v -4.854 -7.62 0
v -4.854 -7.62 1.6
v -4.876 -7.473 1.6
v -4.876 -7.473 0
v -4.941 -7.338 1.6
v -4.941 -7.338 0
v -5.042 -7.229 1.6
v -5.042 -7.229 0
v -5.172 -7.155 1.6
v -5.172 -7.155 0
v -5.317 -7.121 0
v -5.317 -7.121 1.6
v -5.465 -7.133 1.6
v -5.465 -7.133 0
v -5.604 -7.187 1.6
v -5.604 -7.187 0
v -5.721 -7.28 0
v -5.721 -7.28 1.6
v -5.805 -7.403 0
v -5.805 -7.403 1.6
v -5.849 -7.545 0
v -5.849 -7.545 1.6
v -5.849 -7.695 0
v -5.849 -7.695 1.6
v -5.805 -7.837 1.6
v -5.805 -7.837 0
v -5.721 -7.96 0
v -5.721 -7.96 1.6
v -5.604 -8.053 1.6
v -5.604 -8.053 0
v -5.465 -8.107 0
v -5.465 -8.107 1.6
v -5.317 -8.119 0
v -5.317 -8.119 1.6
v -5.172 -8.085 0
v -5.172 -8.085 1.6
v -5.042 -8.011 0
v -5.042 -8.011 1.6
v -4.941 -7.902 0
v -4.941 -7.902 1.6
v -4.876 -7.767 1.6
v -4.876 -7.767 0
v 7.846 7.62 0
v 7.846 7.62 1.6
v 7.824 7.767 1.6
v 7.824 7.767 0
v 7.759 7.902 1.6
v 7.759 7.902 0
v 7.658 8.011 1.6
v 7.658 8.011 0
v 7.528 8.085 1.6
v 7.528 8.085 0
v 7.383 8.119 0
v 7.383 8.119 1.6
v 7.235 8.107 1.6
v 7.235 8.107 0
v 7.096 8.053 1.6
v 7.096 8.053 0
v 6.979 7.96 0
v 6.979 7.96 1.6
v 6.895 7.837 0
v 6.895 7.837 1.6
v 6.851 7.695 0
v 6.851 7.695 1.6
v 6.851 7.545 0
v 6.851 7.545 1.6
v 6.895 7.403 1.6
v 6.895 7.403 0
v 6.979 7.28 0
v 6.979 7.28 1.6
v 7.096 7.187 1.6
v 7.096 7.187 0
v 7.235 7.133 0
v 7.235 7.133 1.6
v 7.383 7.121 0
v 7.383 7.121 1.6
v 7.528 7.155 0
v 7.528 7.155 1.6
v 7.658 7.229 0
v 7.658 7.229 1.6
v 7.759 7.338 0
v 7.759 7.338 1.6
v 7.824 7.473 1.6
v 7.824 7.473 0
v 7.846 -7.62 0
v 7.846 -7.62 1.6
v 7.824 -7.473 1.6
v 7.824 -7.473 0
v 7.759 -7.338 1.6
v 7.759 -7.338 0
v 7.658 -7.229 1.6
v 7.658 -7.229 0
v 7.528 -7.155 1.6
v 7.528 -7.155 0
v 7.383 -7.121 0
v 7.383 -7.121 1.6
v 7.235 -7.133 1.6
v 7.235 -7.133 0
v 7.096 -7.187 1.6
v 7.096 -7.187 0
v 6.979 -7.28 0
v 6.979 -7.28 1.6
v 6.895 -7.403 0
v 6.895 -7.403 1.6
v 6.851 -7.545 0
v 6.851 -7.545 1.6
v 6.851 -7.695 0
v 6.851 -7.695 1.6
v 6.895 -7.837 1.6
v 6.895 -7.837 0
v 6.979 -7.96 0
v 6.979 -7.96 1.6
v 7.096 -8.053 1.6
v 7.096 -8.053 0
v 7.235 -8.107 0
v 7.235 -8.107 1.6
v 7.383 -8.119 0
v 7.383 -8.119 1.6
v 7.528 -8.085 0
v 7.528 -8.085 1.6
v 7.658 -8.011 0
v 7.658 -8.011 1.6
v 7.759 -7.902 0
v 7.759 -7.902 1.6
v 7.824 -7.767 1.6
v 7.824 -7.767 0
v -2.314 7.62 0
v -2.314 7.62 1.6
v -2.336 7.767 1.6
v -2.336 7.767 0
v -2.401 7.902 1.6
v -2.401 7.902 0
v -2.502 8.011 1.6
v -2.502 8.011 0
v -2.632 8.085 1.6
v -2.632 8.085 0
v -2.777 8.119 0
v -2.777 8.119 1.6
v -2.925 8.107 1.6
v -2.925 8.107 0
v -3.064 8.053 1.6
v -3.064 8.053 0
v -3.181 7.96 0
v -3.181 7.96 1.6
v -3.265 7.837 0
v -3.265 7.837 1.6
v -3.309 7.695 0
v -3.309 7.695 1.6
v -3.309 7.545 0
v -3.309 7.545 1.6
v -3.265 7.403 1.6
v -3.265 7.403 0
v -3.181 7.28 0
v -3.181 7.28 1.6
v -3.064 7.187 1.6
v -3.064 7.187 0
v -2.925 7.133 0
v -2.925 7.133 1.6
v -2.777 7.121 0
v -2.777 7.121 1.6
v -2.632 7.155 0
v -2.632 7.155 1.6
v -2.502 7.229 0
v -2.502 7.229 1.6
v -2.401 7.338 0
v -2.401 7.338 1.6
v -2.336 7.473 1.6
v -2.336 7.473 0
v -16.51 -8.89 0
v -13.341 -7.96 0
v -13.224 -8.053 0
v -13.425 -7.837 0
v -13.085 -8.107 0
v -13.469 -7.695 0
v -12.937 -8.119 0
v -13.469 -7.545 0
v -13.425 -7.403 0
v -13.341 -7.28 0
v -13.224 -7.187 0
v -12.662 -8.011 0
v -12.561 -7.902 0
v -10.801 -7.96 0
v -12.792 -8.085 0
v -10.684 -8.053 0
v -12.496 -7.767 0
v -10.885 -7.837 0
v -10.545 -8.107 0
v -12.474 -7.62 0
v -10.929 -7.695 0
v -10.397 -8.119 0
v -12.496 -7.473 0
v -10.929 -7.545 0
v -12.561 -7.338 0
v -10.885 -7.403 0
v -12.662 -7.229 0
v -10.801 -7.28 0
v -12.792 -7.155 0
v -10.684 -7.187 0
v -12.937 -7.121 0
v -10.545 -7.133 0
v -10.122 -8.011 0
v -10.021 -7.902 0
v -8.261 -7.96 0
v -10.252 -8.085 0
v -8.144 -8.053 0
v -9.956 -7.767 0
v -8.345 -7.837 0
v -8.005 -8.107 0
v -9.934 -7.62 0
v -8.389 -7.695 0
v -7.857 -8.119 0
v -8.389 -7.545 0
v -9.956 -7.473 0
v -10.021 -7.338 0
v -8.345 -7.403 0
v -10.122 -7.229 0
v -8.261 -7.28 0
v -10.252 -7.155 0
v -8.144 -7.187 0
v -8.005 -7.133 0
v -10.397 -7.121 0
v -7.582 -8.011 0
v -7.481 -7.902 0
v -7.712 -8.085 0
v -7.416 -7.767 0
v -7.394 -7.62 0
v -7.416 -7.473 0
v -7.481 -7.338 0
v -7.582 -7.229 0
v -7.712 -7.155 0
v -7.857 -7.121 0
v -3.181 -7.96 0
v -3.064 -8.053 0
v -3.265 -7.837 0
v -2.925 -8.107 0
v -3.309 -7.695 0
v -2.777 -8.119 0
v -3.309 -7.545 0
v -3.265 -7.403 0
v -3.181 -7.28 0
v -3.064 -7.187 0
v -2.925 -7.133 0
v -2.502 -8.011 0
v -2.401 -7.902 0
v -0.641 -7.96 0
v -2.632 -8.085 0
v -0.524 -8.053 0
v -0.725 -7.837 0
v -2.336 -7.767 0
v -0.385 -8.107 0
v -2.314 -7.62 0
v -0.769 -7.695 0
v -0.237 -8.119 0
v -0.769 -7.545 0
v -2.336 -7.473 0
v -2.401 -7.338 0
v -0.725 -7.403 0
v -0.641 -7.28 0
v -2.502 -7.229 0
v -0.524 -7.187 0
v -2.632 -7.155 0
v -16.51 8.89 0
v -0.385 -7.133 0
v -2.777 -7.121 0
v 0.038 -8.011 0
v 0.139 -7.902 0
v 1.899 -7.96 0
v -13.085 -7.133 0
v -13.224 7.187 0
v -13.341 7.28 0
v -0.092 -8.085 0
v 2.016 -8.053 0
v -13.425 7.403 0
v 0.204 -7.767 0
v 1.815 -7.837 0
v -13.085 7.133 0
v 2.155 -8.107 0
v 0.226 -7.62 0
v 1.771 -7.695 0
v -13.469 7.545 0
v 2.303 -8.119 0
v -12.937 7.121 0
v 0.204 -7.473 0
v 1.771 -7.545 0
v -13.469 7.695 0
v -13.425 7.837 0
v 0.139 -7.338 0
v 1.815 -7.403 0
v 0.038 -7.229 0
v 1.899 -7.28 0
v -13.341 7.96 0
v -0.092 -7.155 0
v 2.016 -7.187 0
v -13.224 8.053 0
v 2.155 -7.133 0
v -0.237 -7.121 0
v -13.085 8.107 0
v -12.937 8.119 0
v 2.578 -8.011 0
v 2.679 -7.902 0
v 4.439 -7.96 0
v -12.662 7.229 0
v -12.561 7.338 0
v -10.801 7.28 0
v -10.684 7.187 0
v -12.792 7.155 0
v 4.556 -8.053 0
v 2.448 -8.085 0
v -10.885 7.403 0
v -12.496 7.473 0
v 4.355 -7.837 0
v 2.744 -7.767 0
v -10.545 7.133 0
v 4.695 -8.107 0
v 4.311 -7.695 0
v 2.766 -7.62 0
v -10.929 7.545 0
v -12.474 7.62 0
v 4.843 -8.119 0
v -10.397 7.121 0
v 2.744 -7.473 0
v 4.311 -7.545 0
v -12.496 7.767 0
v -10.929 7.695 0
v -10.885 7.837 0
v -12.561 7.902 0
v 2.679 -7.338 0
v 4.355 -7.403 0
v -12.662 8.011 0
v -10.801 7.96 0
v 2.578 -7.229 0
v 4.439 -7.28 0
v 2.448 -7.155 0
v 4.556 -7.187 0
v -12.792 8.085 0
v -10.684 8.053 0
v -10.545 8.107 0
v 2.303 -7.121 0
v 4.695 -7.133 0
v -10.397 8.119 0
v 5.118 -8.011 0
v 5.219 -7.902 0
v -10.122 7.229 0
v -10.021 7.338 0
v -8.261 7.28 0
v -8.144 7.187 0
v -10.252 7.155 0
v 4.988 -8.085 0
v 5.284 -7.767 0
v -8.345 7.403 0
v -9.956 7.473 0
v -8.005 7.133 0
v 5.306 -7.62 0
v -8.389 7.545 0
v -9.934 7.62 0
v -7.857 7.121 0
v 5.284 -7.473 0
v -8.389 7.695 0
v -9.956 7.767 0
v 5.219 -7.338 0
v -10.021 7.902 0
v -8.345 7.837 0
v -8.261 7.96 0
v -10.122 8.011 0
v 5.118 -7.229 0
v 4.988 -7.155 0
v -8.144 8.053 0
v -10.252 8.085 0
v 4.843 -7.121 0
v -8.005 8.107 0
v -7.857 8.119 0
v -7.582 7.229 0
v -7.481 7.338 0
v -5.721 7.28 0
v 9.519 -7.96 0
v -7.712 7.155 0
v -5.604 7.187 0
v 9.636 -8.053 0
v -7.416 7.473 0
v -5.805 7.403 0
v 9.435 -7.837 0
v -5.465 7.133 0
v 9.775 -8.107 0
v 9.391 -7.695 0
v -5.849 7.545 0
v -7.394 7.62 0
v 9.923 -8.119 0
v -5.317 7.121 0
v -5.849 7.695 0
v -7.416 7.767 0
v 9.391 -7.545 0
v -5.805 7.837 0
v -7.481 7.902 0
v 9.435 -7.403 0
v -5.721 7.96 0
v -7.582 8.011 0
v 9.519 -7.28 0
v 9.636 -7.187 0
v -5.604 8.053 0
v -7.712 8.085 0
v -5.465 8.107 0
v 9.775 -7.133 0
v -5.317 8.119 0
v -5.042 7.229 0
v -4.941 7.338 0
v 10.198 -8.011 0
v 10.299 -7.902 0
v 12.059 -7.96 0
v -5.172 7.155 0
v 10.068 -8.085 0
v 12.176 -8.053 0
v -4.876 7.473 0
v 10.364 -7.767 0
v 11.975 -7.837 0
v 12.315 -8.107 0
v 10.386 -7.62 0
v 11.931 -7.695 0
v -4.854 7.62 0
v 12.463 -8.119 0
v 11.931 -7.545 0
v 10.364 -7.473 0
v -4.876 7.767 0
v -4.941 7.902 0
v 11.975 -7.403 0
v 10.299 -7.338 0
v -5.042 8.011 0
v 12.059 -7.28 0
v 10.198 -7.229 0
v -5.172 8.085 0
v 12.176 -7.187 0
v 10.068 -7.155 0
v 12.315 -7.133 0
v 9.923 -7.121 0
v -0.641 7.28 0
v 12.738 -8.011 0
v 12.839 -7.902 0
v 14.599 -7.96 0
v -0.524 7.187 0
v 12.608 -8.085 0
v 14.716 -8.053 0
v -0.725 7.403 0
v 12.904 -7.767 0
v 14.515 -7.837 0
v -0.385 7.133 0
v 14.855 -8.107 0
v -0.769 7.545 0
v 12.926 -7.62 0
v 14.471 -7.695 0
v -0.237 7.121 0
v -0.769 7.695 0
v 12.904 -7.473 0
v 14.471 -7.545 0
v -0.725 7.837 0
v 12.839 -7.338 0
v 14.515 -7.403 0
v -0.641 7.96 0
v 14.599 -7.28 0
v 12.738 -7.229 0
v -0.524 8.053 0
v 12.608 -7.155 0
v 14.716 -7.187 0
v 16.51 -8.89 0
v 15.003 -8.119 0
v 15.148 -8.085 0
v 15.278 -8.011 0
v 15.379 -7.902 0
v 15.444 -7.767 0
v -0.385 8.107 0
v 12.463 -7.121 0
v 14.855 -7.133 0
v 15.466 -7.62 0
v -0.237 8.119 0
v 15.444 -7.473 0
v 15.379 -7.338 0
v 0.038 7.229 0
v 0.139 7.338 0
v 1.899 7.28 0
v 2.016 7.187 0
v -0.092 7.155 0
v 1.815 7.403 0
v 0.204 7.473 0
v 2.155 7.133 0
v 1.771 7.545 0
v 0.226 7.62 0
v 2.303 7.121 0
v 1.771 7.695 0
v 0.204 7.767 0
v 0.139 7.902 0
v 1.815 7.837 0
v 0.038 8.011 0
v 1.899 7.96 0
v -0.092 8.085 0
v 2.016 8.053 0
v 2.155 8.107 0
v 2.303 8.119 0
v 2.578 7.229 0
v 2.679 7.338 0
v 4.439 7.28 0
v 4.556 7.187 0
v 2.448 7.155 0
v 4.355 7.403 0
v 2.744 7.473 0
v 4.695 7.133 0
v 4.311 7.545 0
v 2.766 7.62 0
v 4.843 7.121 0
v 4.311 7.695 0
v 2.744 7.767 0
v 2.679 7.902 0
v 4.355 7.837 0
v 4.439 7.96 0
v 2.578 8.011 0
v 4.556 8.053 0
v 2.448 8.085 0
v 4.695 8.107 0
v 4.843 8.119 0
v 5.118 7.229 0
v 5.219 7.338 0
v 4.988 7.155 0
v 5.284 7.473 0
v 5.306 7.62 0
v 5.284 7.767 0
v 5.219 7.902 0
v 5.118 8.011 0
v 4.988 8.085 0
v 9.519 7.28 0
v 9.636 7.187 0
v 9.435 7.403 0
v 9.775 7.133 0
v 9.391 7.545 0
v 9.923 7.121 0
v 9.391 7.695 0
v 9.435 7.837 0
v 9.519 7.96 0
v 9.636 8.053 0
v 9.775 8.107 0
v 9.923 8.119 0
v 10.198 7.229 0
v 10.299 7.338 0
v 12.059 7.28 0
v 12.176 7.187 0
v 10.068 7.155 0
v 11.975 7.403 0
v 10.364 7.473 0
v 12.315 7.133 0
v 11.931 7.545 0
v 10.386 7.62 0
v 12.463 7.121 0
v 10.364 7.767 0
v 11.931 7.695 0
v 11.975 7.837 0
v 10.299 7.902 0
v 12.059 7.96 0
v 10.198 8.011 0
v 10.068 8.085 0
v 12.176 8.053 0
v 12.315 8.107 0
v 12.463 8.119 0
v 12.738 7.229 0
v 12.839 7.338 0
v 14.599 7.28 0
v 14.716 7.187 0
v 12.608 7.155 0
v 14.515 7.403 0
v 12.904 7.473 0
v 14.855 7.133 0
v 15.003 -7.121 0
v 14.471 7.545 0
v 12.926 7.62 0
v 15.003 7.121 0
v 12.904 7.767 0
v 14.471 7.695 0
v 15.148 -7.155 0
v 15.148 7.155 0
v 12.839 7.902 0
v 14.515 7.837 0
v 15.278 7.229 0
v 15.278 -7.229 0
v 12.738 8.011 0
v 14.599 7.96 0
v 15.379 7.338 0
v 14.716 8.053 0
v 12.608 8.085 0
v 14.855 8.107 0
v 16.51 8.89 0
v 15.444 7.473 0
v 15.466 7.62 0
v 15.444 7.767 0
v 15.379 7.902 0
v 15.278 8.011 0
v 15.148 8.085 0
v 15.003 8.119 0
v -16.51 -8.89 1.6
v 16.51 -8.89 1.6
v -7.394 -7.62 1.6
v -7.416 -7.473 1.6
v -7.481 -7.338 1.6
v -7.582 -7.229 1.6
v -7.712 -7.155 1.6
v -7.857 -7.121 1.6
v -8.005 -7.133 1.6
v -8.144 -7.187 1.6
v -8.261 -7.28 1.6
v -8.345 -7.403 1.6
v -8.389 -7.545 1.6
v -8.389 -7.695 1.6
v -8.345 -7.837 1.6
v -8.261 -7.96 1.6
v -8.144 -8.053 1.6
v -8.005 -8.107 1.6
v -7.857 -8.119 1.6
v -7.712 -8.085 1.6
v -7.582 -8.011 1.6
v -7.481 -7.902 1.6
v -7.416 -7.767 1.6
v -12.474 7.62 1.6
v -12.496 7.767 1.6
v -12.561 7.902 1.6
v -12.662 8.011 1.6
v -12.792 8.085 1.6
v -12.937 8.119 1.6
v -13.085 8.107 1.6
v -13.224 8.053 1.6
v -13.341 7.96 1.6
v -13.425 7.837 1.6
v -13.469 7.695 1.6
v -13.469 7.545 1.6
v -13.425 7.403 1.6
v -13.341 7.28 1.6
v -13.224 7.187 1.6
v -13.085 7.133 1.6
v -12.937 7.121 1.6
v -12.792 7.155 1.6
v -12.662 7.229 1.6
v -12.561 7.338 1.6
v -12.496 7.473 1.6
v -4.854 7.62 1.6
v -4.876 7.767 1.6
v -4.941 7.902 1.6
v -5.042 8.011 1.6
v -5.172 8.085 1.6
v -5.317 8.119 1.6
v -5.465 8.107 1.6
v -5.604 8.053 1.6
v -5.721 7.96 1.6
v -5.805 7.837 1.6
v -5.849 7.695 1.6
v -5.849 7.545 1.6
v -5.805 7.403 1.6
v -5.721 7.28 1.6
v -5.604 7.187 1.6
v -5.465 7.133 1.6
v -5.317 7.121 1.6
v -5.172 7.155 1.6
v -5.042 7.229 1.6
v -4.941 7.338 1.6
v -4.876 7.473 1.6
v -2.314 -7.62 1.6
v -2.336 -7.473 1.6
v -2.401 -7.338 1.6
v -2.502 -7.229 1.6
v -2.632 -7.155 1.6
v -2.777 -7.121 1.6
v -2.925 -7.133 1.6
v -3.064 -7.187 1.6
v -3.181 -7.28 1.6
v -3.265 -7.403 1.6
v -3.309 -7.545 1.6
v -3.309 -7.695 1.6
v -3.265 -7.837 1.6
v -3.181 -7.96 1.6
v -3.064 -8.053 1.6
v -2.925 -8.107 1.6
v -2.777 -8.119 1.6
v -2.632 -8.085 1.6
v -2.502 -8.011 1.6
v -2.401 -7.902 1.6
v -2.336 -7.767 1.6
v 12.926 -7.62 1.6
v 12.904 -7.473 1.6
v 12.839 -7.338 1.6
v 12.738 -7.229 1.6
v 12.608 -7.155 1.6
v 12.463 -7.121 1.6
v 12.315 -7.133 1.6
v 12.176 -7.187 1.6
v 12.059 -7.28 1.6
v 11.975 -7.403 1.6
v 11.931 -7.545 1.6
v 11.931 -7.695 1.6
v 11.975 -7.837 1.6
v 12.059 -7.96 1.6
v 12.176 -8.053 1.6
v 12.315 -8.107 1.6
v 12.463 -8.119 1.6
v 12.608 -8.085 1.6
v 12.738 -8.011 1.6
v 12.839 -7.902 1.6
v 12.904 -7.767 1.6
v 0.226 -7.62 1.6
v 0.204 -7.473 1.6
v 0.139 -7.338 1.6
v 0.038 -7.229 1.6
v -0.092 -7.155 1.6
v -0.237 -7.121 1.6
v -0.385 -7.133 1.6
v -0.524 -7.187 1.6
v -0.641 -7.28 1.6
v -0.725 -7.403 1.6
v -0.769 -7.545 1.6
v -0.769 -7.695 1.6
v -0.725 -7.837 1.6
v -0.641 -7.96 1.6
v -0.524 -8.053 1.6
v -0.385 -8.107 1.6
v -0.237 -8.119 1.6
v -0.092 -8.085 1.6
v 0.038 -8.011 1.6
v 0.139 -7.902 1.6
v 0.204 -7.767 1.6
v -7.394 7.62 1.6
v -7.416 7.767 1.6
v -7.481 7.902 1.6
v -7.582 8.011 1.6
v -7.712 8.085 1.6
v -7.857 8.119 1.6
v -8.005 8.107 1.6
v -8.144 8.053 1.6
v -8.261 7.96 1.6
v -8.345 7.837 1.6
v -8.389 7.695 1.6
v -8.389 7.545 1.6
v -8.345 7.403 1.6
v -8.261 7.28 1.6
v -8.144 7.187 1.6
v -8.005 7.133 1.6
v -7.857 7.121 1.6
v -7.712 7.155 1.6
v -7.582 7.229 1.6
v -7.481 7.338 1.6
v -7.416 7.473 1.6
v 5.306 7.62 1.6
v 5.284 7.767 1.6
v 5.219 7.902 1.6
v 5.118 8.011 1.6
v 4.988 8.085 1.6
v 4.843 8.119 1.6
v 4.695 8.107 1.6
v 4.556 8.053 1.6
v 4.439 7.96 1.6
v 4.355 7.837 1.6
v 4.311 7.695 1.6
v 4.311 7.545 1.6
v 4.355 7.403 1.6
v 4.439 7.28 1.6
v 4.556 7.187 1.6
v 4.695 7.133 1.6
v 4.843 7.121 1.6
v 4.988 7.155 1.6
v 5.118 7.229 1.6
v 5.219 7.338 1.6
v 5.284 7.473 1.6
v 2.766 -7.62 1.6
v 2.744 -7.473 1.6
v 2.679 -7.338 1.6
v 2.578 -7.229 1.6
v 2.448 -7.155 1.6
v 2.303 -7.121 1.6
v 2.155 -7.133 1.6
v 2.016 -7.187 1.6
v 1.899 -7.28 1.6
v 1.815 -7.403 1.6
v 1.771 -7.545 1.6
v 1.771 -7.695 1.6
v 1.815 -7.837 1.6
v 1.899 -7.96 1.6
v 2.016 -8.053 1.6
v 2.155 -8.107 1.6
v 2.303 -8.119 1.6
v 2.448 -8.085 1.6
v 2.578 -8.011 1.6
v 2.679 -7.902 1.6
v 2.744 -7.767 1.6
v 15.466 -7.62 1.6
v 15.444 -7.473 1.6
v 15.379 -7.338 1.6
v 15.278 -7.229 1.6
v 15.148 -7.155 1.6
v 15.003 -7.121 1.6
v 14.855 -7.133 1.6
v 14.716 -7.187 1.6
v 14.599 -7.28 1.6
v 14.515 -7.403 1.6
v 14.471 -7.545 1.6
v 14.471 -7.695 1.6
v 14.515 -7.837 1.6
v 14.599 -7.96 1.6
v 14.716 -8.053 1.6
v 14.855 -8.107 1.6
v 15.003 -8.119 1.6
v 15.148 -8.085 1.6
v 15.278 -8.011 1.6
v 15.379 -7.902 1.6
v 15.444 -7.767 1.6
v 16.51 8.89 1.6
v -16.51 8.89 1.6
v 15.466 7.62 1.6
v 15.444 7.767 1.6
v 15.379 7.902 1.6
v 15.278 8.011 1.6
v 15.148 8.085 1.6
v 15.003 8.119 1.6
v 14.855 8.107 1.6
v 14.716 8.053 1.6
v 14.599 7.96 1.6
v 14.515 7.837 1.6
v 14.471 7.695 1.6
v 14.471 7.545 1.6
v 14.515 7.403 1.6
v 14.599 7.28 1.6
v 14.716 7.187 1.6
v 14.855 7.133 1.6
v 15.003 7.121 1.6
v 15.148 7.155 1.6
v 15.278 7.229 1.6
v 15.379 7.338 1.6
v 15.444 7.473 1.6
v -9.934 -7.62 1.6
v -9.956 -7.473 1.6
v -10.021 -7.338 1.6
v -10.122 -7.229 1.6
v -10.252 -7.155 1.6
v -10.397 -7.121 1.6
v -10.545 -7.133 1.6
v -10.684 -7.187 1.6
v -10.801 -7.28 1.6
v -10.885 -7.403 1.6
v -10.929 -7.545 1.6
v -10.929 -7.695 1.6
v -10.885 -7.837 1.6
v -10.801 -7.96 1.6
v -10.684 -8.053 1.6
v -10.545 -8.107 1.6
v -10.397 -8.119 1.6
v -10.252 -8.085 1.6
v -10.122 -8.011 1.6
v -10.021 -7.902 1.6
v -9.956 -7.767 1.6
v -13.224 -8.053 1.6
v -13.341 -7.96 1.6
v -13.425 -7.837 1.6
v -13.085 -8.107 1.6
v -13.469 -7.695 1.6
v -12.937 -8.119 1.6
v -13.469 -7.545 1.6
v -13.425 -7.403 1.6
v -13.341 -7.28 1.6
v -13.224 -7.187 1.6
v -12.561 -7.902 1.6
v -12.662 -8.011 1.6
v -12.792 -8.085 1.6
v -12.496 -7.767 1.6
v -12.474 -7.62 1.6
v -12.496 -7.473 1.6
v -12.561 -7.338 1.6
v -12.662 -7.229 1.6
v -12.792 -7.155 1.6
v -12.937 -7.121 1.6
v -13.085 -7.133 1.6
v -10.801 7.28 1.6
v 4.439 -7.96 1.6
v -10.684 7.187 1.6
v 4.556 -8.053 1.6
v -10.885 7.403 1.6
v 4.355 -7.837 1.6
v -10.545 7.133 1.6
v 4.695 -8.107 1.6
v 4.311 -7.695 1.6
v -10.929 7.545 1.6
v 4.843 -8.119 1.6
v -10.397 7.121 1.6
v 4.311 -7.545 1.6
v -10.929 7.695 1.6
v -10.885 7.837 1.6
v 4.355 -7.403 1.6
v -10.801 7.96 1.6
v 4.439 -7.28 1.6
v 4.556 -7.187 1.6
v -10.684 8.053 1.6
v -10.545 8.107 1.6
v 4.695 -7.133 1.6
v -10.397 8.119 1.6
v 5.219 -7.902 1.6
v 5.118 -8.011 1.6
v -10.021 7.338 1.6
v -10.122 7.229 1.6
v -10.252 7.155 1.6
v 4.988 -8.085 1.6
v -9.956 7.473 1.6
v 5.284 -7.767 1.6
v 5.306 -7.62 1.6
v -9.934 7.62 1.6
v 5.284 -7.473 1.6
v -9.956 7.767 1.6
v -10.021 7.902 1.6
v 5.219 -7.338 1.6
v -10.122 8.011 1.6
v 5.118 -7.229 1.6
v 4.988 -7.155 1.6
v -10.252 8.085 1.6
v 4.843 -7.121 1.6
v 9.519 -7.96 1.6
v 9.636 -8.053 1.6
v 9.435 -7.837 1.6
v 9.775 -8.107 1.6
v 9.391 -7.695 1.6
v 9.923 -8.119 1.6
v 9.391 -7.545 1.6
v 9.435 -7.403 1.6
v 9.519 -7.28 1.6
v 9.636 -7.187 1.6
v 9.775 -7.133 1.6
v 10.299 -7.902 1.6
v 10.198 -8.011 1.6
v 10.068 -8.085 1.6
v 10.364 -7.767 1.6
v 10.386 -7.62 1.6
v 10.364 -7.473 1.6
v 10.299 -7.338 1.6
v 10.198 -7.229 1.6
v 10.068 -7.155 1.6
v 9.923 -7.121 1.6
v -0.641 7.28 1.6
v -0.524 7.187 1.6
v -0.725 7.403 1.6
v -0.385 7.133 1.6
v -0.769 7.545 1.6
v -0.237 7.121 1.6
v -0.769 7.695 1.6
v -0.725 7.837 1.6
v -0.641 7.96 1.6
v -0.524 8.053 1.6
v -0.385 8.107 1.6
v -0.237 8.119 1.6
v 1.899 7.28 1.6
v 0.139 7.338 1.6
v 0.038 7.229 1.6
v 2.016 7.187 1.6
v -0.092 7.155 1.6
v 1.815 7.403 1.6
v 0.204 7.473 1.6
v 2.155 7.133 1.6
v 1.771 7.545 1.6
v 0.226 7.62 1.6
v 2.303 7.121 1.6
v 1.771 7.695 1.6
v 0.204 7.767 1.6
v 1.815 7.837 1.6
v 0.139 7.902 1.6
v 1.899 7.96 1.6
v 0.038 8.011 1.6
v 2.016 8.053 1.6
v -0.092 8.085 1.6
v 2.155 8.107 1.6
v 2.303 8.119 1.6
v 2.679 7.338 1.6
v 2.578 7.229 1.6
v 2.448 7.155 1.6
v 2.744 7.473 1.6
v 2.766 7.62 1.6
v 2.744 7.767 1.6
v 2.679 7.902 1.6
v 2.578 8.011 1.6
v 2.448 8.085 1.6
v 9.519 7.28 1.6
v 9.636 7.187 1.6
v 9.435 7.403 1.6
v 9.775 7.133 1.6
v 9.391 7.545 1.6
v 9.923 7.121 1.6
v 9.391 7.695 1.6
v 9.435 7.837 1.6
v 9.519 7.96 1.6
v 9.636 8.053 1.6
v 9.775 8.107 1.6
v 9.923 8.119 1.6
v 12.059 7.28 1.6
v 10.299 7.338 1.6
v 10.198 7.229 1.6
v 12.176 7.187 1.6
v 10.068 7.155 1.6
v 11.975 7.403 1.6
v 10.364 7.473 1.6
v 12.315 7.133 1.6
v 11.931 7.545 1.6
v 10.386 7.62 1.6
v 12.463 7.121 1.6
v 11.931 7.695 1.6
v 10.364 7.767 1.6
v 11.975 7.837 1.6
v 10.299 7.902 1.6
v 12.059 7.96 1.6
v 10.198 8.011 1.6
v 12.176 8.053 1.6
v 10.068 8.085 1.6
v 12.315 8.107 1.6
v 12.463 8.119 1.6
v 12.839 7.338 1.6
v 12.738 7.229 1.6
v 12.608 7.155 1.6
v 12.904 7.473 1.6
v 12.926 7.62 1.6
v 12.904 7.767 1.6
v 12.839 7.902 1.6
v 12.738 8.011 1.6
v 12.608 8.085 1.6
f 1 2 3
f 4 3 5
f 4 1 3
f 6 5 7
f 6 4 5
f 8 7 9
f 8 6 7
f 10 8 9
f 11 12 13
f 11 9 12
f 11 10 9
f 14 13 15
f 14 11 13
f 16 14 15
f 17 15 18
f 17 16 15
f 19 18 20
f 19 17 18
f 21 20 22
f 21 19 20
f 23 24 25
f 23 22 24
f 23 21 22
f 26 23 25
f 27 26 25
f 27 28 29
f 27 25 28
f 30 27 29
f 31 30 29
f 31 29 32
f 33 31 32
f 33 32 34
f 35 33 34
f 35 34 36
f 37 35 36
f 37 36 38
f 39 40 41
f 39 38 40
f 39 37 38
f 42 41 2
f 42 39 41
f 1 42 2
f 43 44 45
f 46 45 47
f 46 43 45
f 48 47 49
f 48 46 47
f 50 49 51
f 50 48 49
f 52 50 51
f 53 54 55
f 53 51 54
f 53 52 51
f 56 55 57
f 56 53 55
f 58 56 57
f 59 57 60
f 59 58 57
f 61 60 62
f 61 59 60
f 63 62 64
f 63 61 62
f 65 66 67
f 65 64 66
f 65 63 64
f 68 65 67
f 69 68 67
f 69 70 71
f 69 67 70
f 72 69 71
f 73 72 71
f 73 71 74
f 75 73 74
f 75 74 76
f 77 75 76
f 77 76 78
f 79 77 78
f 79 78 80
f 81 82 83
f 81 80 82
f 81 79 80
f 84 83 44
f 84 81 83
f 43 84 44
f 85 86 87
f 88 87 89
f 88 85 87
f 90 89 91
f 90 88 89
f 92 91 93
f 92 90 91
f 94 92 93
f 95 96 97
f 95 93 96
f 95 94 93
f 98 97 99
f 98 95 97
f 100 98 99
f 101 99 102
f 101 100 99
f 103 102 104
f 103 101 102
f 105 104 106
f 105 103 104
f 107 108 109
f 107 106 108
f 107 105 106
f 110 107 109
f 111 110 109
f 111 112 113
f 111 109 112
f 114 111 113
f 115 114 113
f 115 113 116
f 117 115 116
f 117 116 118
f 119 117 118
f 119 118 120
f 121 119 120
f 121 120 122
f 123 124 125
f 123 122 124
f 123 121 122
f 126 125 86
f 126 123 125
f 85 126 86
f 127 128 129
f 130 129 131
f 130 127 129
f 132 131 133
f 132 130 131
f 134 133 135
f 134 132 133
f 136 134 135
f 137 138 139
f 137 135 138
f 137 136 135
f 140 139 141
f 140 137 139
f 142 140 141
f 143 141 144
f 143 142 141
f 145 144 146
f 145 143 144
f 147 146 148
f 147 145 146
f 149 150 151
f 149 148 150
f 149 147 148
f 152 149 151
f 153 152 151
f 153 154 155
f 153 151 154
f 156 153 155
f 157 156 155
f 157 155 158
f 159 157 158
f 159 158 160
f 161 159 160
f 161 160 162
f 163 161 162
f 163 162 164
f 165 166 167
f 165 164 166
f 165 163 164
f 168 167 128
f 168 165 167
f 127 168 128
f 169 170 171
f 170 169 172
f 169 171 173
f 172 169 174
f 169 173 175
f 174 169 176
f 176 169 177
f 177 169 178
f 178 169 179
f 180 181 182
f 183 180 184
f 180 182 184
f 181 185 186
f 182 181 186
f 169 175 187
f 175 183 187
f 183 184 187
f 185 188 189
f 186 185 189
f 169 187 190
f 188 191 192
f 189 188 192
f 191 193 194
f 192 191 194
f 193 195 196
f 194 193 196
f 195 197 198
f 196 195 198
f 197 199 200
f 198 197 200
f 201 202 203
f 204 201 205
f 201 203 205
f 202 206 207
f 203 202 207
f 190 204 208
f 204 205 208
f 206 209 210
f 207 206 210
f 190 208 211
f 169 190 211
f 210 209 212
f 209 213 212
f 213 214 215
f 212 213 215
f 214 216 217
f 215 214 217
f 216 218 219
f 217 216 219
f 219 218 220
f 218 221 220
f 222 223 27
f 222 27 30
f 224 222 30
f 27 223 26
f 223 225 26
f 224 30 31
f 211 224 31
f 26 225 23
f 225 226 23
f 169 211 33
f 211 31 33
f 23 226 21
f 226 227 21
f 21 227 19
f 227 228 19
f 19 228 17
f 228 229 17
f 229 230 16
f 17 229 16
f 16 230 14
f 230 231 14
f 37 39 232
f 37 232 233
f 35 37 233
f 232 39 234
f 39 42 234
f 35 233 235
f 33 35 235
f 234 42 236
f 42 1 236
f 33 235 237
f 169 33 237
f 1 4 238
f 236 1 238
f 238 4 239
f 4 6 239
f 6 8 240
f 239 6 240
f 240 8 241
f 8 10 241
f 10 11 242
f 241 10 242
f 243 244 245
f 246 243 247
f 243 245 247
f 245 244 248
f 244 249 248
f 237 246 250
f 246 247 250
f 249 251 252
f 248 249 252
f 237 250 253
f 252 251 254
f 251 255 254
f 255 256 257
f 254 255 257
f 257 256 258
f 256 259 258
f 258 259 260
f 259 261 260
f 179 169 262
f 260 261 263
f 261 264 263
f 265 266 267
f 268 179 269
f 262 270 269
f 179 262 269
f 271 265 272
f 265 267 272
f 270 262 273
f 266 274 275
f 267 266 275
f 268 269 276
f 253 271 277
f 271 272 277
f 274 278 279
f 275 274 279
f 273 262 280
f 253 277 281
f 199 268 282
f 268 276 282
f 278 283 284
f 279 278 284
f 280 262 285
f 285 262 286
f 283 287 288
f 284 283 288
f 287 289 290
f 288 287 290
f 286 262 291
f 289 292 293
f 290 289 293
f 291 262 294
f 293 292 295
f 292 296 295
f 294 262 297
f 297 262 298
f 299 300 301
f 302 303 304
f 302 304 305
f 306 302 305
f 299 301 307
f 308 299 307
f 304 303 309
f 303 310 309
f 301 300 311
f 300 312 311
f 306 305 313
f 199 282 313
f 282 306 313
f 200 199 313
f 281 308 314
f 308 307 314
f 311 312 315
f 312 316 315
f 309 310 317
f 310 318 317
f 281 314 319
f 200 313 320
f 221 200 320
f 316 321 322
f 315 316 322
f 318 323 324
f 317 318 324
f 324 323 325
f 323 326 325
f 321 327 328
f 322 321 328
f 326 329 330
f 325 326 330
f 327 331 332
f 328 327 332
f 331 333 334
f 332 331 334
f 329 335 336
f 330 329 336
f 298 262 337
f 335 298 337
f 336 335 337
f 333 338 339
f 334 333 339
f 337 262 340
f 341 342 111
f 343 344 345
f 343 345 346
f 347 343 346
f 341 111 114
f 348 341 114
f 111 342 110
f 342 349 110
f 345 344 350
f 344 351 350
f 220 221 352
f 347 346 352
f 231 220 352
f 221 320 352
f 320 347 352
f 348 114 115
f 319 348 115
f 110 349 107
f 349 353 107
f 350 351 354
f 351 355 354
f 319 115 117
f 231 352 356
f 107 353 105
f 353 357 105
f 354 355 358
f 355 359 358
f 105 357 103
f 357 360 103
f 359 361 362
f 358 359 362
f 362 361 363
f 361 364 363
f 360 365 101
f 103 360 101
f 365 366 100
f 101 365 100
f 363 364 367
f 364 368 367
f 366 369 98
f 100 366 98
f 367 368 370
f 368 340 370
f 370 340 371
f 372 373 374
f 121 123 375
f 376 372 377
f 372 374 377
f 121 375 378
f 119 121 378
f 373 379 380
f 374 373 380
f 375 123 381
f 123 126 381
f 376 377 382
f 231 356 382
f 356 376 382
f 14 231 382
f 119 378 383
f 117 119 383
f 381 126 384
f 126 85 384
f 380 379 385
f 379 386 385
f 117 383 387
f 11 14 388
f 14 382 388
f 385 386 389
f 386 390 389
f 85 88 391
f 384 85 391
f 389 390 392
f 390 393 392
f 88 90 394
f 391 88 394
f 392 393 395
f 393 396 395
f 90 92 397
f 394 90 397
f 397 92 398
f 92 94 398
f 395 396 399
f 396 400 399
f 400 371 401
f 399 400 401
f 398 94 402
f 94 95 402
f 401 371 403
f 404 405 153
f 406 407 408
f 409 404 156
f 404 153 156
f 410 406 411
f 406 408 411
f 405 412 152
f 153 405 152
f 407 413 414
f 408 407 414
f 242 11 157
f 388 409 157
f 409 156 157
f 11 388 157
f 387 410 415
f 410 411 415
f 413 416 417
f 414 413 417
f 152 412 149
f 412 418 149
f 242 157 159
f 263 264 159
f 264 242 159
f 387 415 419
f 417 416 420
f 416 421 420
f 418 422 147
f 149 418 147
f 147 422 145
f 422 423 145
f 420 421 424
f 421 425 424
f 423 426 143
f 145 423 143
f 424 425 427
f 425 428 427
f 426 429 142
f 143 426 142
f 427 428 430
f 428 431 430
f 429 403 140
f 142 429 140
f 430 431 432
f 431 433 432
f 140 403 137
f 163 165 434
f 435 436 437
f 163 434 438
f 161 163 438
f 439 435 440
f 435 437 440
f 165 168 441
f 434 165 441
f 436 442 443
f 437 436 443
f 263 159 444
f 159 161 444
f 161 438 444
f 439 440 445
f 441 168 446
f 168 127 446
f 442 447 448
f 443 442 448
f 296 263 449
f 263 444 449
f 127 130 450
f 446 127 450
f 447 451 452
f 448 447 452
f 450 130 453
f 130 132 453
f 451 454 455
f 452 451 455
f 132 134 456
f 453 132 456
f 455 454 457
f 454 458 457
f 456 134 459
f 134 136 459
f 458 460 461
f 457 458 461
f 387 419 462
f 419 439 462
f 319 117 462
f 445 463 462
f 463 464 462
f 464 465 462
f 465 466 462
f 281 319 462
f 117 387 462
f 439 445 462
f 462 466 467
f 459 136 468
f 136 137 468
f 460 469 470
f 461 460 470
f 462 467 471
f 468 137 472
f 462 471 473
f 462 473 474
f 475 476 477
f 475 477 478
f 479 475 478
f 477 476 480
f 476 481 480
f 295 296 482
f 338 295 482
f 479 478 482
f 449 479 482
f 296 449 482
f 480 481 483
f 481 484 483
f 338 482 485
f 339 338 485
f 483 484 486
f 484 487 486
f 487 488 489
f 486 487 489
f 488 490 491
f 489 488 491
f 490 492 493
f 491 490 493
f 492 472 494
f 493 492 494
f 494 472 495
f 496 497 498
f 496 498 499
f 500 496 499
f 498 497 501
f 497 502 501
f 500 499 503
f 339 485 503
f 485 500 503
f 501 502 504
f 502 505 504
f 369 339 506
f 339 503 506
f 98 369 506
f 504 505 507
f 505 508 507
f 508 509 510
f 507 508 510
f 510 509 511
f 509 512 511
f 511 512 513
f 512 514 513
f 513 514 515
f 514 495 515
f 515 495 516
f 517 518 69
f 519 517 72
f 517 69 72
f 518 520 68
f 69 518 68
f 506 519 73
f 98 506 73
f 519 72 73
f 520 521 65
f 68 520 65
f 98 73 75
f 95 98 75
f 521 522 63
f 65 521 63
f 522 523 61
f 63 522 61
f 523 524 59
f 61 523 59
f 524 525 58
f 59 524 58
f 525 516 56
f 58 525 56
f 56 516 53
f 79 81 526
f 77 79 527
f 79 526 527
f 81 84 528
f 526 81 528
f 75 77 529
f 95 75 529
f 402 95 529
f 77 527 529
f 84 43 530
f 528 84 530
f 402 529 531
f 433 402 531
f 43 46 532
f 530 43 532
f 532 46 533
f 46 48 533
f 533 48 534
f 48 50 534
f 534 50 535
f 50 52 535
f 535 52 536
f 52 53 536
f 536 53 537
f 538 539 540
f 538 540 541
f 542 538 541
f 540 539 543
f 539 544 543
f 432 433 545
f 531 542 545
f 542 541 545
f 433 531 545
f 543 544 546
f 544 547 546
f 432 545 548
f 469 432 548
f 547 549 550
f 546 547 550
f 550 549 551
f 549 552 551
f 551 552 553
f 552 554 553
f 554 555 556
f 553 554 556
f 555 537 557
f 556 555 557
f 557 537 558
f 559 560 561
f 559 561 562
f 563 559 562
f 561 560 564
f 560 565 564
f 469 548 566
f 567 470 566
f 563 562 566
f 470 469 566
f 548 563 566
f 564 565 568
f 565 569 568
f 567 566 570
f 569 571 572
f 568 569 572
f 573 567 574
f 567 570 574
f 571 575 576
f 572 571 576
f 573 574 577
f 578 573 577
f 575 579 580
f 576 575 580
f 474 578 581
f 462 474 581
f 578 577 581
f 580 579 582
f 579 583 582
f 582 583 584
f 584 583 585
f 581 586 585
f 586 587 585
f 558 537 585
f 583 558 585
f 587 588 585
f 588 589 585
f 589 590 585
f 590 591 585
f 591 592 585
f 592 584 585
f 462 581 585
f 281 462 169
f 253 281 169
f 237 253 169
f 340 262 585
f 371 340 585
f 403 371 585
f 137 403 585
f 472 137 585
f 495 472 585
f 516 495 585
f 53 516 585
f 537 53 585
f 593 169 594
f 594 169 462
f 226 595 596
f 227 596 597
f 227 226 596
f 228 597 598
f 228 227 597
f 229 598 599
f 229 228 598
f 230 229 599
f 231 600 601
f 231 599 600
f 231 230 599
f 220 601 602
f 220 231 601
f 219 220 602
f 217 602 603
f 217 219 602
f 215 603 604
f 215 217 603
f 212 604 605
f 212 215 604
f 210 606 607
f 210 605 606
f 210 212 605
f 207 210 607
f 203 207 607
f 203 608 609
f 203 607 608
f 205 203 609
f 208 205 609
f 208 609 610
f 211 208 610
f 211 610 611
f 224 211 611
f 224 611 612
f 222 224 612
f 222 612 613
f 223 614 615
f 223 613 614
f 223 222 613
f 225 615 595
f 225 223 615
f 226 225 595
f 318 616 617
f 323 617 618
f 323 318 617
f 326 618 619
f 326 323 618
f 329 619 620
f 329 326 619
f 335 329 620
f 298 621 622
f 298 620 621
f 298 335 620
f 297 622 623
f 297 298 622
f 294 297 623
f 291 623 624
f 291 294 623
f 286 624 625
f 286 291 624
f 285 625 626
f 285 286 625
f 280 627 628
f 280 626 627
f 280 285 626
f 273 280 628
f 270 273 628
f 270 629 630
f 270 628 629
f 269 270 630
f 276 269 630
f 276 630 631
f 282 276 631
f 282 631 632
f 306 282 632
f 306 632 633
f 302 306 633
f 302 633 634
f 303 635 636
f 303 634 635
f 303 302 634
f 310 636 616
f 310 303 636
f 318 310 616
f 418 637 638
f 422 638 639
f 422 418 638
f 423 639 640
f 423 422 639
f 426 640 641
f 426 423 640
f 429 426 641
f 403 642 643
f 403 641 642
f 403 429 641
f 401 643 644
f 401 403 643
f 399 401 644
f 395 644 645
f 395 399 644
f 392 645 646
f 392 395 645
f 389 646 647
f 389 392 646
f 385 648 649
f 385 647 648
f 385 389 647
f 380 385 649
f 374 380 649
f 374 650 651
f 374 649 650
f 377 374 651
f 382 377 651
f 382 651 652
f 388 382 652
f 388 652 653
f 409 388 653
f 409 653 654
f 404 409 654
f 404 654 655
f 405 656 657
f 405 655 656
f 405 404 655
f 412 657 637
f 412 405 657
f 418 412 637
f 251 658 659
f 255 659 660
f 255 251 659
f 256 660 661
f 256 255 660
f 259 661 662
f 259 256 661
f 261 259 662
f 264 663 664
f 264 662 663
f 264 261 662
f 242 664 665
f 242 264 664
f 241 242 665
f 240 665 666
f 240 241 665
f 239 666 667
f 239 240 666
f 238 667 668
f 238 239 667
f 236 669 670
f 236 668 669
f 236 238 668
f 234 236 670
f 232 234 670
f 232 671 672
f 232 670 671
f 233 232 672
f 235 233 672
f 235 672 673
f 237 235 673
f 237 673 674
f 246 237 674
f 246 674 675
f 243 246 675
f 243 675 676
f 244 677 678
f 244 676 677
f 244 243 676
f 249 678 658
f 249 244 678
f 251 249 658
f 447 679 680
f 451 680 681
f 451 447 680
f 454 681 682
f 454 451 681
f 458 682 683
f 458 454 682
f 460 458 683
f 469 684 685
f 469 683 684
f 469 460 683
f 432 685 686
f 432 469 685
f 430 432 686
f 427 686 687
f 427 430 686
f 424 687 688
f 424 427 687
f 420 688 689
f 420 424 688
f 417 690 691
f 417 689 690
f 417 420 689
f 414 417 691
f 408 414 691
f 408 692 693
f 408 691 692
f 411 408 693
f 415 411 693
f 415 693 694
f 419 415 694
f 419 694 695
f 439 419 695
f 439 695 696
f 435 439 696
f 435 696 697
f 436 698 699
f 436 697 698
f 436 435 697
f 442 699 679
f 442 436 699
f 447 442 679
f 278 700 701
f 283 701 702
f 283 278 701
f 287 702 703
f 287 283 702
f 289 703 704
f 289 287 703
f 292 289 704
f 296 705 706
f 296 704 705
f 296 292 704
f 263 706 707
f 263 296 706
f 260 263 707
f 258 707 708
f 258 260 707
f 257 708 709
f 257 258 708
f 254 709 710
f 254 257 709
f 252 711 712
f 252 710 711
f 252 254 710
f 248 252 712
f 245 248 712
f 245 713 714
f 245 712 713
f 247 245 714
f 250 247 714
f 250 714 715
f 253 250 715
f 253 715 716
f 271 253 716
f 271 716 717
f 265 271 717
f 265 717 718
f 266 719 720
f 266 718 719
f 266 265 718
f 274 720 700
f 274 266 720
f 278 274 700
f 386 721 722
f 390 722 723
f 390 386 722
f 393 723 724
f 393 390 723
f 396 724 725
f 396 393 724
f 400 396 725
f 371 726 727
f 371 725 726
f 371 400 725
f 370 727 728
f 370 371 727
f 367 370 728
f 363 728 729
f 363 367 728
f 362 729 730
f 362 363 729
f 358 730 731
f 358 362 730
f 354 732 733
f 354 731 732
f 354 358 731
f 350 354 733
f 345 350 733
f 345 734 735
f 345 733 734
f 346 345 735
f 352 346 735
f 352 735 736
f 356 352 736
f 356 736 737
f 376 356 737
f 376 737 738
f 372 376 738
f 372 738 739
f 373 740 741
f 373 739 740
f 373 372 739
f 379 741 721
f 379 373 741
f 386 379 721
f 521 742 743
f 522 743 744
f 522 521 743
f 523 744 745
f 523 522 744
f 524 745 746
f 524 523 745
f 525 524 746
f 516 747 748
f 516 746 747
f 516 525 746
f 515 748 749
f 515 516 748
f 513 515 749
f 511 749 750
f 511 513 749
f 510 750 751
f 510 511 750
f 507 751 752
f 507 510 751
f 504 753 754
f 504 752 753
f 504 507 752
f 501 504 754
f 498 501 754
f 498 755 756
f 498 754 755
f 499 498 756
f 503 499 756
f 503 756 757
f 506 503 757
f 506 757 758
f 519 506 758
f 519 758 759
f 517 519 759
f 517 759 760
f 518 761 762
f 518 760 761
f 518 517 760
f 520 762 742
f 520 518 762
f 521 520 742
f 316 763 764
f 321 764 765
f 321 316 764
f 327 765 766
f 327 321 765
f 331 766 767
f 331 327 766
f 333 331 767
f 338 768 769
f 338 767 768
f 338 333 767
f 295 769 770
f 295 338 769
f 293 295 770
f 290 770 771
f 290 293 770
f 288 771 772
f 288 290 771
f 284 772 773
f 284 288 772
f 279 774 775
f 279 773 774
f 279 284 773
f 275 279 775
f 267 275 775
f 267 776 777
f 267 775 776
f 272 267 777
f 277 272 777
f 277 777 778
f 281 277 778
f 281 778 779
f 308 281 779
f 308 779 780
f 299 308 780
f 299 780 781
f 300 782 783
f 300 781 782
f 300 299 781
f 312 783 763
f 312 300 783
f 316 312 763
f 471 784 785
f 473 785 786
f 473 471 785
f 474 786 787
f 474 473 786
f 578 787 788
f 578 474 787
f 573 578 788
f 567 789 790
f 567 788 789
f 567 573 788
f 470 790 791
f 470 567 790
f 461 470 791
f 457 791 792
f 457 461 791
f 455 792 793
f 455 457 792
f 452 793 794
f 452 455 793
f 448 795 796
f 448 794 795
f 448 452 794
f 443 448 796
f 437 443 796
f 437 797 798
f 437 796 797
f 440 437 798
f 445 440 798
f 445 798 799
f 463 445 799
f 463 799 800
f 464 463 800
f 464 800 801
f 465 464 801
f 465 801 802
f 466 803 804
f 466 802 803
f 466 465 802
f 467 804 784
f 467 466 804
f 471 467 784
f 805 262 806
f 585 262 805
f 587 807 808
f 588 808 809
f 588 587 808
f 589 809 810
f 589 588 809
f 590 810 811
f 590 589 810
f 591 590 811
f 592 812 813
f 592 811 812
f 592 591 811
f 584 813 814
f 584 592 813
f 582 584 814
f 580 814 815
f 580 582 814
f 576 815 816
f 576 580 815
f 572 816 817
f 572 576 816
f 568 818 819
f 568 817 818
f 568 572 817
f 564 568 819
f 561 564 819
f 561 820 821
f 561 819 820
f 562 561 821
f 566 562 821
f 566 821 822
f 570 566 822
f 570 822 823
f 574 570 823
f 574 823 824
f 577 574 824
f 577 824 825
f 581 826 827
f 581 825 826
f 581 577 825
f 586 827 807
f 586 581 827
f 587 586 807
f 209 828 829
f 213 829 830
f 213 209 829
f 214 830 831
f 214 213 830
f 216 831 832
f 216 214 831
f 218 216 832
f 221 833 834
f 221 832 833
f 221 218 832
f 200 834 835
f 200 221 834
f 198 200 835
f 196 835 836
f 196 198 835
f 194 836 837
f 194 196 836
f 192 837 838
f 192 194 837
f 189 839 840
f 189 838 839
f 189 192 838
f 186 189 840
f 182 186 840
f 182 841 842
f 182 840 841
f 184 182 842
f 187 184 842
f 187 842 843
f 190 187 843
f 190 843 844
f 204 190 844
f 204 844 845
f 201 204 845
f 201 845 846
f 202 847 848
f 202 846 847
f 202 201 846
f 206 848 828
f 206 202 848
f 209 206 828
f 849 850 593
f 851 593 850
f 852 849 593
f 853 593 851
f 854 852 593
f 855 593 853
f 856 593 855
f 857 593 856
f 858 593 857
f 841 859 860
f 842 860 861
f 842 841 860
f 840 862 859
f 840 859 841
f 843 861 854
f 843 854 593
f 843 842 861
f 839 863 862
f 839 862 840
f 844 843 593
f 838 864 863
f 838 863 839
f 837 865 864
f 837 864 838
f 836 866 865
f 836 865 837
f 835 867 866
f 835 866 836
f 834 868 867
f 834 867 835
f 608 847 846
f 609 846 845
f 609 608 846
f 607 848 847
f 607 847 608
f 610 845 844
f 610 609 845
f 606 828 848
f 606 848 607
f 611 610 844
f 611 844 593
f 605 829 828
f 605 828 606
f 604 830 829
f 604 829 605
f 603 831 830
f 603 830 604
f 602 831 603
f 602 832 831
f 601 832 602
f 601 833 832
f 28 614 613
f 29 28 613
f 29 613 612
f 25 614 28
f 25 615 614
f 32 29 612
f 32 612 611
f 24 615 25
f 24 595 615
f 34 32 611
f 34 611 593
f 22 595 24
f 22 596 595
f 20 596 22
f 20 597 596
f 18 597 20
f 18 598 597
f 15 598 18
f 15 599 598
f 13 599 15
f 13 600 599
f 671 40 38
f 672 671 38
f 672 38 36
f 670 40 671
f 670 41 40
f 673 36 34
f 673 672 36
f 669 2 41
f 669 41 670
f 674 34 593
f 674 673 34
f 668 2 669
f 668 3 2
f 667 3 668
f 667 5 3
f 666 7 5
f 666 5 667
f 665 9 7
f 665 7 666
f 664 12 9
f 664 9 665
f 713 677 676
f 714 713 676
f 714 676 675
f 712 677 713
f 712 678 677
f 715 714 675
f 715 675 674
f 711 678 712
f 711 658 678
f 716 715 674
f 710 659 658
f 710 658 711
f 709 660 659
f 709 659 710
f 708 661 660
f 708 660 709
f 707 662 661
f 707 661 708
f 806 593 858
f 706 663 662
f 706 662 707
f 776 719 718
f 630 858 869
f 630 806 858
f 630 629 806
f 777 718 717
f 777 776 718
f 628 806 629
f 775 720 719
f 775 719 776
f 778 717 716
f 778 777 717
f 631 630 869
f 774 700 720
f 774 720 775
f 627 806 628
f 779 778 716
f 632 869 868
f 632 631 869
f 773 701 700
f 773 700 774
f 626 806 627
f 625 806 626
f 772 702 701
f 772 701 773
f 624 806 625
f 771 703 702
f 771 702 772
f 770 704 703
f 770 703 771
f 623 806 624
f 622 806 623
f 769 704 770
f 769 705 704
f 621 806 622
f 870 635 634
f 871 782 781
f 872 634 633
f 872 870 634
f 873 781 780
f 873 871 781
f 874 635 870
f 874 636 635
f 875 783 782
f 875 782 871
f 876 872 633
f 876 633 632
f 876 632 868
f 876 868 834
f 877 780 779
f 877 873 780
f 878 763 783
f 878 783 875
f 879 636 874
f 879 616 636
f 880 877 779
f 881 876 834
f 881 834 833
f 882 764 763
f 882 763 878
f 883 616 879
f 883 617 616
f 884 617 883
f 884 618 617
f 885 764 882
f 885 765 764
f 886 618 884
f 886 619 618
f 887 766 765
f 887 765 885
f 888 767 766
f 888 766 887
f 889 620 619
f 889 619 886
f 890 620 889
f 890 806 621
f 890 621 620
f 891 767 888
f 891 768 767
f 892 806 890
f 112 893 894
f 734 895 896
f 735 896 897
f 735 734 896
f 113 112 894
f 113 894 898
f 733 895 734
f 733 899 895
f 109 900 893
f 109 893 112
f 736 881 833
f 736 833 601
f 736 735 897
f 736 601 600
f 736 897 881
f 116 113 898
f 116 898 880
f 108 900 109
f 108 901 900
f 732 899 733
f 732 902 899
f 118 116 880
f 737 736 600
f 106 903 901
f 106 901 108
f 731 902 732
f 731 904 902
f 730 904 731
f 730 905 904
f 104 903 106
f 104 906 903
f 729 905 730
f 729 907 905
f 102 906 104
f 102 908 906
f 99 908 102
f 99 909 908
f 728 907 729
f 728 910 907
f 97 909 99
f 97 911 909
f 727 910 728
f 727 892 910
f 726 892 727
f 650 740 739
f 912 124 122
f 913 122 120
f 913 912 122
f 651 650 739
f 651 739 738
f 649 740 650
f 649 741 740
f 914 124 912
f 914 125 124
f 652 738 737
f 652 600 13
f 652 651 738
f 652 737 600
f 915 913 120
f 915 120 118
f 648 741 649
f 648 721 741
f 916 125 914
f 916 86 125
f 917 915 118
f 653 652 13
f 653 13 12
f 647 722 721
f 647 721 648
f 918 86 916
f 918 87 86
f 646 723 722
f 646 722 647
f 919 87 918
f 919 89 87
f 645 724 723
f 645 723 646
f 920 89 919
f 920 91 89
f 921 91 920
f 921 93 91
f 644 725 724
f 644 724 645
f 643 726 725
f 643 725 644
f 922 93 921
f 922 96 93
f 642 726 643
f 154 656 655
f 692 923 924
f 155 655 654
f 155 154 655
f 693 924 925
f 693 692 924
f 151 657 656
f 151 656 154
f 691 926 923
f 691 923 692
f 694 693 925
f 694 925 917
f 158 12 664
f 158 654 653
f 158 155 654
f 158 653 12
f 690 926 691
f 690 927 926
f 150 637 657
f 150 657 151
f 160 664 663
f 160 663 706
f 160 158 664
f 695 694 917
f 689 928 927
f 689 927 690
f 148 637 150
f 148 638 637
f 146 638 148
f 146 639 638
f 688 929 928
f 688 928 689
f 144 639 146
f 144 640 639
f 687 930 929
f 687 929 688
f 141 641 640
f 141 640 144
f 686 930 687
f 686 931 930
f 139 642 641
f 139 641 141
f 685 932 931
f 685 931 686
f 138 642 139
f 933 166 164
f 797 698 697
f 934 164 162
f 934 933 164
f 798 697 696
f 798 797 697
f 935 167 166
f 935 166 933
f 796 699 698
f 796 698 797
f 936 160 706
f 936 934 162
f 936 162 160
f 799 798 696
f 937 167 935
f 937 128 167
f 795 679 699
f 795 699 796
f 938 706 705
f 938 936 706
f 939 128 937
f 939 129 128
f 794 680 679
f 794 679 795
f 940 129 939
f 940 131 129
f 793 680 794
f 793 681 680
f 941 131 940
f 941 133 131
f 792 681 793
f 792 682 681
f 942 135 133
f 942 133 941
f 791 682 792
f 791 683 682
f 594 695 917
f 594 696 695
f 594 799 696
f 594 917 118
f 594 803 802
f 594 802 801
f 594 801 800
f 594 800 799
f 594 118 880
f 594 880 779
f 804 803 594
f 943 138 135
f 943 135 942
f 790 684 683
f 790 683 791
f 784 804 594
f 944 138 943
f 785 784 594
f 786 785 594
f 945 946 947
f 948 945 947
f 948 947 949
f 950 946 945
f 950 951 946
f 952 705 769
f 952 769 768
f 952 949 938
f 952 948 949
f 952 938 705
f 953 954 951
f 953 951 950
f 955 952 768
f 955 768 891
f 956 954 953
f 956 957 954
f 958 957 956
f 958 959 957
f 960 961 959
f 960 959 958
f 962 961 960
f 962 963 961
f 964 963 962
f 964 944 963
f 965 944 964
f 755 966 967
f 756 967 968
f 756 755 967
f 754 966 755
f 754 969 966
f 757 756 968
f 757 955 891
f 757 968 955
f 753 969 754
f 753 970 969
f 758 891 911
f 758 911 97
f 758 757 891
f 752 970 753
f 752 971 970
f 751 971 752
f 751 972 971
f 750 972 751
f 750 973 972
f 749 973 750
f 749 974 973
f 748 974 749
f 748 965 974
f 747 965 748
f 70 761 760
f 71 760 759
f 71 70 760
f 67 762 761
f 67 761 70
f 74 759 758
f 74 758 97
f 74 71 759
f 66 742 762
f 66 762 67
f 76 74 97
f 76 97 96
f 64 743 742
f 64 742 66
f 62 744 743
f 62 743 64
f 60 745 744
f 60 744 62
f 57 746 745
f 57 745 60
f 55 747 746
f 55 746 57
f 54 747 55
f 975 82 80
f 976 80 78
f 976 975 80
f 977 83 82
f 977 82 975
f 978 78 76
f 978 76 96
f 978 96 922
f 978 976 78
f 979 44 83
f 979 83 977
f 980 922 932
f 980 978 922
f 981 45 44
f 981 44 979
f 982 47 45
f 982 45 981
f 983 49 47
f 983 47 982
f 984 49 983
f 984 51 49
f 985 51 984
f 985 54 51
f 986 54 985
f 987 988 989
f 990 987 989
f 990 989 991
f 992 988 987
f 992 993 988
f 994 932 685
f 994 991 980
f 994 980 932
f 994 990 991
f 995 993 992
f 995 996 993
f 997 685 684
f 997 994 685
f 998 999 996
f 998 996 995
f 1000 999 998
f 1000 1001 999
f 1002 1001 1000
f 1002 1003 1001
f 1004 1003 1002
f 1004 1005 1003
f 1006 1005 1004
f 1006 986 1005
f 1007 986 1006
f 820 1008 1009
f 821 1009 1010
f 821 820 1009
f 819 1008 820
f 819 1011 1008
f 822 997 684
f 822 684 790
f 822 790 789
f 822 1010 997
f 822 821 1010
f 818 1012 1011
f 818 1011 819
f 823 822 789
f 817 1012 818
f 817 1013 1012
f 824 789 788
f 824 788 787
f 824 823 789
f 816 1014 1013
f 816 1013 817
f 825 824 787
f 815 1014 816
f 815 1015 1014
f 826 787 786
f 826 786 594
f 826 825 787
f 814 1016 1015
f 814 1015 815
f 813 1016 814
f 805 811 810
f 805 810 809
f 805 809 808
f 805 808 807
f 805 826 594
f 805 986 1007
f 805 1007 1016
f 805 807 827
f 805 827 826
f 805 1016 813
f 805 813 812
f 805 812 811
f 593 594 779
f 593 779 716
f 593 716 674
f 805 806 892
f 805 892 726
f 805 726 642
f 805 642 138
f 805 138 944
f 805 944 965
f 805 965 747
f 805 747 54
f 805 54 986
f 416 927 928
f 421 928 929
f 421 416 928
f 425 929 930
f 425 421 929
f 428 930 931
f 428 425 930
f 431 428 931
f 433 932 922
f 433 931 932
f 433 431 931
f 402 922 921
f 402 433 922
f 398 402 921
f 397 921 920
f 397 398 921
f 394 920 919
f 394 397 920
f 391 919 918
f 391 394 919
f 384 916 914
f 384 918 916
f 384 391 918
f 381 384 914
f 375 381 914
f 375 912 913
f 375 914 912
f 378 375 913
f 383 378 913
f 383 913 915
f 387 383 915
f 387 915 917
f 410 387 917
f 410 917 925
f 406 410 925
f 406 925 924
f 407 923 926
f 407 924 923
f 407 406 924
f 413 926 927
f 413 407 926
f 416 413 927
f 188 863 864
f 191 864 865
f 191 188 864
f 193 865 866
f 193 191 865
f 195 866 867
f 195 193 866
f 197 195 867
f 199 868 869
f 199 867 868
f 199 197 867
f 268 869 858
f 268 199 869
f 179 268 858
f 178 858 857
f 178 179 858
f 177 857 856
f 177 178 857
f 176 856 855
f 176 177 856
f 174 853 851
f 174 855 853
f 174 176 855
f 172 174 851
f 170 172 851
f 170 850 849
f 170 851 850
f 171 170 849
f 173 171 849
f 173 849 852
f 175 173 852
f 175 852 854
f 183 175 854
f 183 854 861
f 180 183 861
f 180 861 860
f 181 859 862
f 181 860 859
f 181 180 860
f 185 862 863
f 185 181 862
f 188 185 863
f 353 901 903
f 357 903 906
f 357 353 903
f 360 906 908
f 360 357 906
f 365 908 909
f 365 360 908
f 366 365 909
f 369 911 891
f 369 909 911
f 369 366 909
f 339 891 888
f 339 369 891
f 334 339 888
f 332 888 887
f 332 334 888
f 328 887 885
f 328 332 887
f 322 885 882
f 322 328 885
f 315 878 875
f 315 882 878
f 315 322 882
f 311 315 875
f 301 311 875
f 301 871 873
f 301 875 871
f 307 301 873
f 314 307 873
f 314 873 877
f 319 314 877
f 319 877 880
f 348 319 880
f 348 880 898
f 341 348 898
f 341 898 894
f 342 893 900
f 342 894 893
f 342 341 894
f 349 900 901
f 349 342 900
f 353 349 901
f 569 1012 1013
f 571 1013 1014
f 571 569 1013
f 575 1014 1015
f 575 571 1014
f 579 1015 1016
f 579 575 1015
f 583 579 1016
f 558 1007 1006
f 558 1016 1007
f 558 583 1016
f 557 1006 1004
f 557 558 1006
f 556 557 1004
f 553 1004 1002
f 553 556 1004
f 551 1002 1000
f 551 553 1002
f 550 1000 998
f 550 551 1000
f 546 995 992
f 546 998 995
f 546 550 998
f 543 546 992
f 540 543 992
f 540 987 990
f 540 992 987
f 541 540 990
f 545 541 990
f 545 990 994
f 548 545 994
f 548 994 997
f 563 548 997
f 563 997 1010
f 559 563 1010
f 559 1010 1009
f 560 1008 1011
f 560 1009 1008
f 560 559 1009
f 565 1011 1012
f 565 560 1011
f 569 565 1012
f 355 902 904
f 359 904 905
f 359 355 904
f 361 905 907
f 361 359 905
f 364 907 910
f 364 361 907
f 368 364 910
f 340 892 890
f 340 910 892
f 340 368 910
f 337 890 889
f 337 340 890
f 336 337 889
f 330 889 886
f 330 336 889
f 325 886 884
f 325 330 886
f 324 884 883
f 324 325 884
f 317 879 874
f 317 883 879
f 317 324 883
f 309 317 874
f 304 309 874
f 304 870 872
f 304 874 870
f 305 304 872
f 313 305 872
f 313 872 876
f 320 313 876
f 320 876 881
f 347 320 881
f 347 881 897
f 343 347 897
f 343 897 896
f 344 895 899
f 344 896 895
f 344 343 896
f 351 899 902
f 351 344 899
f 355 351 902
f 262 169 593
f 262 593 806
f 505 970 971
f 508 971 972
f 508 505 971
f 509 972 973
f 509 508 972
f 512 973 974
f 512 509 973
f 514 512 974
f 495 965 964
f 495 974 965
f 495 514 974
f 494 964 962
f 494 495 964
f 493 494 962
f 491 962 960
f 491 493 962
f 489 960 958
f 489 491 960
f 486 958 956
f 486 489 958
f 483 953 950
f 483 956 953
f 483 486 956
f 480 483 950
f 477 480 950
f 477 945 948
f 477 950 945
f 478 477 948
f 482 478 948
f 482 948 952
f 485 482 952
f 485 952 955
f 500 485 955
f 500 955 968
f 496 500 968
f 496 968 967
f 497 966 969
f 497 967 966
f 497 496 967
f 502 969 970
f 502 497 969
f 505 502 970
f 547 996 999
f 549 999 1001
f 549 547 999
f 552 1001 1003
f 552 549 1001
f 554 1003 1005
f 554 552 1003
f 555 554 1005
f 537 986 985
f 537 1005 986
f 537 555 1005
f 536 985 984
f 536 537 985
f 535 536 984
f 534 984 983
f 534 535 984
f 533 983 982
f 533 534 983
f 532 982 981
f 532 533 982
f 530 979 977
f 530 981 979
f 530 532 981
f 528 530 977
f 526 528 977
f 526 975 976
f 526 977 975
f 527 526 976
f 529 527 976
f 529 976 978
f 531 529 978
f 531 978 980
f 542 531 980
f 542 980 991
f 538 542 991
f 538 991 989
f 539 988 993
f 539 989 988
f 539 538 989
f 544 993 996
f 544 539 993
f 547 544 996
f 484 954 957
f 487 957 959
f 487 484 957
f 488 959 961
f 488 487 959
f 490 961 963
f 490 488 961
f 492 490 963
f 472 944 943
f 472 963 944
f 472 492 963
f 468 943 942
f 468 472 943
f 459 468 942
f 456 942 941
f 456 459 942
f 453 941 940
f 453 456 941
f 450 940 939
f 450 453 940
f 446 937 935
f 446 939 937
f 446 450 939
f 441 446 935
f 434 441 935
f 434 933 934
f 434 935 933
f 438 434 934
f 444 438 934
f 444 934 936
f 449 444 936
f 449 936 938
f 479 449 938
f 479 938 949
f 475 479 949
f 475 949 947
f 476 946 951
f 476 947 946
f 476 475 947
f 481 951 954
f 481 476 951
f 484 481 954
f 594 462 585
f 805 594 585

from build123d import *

# Parameters (mm, degrees)
F0_W     = 33.02
F0_H     = 17.78
F1_DEPTH = 1.6
F2_R     = 0.5
F3_DEPTH = 25


with BuildPart() as f1:
    # F0 (on Top) → F1 (new body)
    with BuildSketch(Plane.XY):
        Rectangle(F0_W, F0_H)
    extrude(amount=F1_DEPTH)

    # F2 (on Top) → F3 (cut)
    with BuildSketch(Plane.XY):
        with Locations((-12.974238, 7.62)):
            Circle(F2_R)
        with Locations((-10.434238, 7.62)):
            Circle(F2_R)
        with Locations((-7.894238, 7.62)):
            Circle(F2_R)
        with Locations((-5.354238, 7.62)):
            Circle(F2_R)
        with Locations((-2.814238, 7.62)):
            Circle(F2_R)
        with Locations((-0.274238, 7.62)):
            Circle(F2_R)
        with Locations((2.265762, 7.62)):
            Circle(F2_R)
        with Locations((4.805762, 7.62)):
            Circle(F2_R)
        with Locations((7.345762, 7.62)):
            Circle(F2_R)
        with Locations((9.885762, 7.62)):
            Circle(F2_R)
        with Locations((12.425762, 7.62)):
            Circle(F2_R)
        with Locations((14.965762, 7.62)):
            Circle(F2_R)
        with Locations((2.265762, -7.62)):
            Circle(F2_R)
        with Locations((4.805762, -7.62)):
            Circle(F2_R)
        with Locations((7.345762, -7.62)):
            Circle(F2_R)
        with Locations((9.885762, -7.62)):
            Circle(F2_R)
        with Locations((12.425762, -7.62)):
            Circle(F2_R)
        with Locations((-0.274238, -7.62)):
            Circle(F2_R)
        with Locations((14.965762, -7.62)):
            Circle(F2_R)
        with Locations((-2.814238, -7.62)):
            Circle(F2_R)
        with Locations((-7.894238, -7.62)):
            Circle(F2_R)
        with Locations((-12.974238, -7.62)):
            Circle(F2_R)
        with Locations((-5.354238, -7.62)):
            Circle(F2_R)
        with Locations((-10.434238, -7.62)):
            Circle(F2_R)
    extrude(amount=F3_DEPTH, mode=Mode.SUBTRACT)


solid = f1.part
